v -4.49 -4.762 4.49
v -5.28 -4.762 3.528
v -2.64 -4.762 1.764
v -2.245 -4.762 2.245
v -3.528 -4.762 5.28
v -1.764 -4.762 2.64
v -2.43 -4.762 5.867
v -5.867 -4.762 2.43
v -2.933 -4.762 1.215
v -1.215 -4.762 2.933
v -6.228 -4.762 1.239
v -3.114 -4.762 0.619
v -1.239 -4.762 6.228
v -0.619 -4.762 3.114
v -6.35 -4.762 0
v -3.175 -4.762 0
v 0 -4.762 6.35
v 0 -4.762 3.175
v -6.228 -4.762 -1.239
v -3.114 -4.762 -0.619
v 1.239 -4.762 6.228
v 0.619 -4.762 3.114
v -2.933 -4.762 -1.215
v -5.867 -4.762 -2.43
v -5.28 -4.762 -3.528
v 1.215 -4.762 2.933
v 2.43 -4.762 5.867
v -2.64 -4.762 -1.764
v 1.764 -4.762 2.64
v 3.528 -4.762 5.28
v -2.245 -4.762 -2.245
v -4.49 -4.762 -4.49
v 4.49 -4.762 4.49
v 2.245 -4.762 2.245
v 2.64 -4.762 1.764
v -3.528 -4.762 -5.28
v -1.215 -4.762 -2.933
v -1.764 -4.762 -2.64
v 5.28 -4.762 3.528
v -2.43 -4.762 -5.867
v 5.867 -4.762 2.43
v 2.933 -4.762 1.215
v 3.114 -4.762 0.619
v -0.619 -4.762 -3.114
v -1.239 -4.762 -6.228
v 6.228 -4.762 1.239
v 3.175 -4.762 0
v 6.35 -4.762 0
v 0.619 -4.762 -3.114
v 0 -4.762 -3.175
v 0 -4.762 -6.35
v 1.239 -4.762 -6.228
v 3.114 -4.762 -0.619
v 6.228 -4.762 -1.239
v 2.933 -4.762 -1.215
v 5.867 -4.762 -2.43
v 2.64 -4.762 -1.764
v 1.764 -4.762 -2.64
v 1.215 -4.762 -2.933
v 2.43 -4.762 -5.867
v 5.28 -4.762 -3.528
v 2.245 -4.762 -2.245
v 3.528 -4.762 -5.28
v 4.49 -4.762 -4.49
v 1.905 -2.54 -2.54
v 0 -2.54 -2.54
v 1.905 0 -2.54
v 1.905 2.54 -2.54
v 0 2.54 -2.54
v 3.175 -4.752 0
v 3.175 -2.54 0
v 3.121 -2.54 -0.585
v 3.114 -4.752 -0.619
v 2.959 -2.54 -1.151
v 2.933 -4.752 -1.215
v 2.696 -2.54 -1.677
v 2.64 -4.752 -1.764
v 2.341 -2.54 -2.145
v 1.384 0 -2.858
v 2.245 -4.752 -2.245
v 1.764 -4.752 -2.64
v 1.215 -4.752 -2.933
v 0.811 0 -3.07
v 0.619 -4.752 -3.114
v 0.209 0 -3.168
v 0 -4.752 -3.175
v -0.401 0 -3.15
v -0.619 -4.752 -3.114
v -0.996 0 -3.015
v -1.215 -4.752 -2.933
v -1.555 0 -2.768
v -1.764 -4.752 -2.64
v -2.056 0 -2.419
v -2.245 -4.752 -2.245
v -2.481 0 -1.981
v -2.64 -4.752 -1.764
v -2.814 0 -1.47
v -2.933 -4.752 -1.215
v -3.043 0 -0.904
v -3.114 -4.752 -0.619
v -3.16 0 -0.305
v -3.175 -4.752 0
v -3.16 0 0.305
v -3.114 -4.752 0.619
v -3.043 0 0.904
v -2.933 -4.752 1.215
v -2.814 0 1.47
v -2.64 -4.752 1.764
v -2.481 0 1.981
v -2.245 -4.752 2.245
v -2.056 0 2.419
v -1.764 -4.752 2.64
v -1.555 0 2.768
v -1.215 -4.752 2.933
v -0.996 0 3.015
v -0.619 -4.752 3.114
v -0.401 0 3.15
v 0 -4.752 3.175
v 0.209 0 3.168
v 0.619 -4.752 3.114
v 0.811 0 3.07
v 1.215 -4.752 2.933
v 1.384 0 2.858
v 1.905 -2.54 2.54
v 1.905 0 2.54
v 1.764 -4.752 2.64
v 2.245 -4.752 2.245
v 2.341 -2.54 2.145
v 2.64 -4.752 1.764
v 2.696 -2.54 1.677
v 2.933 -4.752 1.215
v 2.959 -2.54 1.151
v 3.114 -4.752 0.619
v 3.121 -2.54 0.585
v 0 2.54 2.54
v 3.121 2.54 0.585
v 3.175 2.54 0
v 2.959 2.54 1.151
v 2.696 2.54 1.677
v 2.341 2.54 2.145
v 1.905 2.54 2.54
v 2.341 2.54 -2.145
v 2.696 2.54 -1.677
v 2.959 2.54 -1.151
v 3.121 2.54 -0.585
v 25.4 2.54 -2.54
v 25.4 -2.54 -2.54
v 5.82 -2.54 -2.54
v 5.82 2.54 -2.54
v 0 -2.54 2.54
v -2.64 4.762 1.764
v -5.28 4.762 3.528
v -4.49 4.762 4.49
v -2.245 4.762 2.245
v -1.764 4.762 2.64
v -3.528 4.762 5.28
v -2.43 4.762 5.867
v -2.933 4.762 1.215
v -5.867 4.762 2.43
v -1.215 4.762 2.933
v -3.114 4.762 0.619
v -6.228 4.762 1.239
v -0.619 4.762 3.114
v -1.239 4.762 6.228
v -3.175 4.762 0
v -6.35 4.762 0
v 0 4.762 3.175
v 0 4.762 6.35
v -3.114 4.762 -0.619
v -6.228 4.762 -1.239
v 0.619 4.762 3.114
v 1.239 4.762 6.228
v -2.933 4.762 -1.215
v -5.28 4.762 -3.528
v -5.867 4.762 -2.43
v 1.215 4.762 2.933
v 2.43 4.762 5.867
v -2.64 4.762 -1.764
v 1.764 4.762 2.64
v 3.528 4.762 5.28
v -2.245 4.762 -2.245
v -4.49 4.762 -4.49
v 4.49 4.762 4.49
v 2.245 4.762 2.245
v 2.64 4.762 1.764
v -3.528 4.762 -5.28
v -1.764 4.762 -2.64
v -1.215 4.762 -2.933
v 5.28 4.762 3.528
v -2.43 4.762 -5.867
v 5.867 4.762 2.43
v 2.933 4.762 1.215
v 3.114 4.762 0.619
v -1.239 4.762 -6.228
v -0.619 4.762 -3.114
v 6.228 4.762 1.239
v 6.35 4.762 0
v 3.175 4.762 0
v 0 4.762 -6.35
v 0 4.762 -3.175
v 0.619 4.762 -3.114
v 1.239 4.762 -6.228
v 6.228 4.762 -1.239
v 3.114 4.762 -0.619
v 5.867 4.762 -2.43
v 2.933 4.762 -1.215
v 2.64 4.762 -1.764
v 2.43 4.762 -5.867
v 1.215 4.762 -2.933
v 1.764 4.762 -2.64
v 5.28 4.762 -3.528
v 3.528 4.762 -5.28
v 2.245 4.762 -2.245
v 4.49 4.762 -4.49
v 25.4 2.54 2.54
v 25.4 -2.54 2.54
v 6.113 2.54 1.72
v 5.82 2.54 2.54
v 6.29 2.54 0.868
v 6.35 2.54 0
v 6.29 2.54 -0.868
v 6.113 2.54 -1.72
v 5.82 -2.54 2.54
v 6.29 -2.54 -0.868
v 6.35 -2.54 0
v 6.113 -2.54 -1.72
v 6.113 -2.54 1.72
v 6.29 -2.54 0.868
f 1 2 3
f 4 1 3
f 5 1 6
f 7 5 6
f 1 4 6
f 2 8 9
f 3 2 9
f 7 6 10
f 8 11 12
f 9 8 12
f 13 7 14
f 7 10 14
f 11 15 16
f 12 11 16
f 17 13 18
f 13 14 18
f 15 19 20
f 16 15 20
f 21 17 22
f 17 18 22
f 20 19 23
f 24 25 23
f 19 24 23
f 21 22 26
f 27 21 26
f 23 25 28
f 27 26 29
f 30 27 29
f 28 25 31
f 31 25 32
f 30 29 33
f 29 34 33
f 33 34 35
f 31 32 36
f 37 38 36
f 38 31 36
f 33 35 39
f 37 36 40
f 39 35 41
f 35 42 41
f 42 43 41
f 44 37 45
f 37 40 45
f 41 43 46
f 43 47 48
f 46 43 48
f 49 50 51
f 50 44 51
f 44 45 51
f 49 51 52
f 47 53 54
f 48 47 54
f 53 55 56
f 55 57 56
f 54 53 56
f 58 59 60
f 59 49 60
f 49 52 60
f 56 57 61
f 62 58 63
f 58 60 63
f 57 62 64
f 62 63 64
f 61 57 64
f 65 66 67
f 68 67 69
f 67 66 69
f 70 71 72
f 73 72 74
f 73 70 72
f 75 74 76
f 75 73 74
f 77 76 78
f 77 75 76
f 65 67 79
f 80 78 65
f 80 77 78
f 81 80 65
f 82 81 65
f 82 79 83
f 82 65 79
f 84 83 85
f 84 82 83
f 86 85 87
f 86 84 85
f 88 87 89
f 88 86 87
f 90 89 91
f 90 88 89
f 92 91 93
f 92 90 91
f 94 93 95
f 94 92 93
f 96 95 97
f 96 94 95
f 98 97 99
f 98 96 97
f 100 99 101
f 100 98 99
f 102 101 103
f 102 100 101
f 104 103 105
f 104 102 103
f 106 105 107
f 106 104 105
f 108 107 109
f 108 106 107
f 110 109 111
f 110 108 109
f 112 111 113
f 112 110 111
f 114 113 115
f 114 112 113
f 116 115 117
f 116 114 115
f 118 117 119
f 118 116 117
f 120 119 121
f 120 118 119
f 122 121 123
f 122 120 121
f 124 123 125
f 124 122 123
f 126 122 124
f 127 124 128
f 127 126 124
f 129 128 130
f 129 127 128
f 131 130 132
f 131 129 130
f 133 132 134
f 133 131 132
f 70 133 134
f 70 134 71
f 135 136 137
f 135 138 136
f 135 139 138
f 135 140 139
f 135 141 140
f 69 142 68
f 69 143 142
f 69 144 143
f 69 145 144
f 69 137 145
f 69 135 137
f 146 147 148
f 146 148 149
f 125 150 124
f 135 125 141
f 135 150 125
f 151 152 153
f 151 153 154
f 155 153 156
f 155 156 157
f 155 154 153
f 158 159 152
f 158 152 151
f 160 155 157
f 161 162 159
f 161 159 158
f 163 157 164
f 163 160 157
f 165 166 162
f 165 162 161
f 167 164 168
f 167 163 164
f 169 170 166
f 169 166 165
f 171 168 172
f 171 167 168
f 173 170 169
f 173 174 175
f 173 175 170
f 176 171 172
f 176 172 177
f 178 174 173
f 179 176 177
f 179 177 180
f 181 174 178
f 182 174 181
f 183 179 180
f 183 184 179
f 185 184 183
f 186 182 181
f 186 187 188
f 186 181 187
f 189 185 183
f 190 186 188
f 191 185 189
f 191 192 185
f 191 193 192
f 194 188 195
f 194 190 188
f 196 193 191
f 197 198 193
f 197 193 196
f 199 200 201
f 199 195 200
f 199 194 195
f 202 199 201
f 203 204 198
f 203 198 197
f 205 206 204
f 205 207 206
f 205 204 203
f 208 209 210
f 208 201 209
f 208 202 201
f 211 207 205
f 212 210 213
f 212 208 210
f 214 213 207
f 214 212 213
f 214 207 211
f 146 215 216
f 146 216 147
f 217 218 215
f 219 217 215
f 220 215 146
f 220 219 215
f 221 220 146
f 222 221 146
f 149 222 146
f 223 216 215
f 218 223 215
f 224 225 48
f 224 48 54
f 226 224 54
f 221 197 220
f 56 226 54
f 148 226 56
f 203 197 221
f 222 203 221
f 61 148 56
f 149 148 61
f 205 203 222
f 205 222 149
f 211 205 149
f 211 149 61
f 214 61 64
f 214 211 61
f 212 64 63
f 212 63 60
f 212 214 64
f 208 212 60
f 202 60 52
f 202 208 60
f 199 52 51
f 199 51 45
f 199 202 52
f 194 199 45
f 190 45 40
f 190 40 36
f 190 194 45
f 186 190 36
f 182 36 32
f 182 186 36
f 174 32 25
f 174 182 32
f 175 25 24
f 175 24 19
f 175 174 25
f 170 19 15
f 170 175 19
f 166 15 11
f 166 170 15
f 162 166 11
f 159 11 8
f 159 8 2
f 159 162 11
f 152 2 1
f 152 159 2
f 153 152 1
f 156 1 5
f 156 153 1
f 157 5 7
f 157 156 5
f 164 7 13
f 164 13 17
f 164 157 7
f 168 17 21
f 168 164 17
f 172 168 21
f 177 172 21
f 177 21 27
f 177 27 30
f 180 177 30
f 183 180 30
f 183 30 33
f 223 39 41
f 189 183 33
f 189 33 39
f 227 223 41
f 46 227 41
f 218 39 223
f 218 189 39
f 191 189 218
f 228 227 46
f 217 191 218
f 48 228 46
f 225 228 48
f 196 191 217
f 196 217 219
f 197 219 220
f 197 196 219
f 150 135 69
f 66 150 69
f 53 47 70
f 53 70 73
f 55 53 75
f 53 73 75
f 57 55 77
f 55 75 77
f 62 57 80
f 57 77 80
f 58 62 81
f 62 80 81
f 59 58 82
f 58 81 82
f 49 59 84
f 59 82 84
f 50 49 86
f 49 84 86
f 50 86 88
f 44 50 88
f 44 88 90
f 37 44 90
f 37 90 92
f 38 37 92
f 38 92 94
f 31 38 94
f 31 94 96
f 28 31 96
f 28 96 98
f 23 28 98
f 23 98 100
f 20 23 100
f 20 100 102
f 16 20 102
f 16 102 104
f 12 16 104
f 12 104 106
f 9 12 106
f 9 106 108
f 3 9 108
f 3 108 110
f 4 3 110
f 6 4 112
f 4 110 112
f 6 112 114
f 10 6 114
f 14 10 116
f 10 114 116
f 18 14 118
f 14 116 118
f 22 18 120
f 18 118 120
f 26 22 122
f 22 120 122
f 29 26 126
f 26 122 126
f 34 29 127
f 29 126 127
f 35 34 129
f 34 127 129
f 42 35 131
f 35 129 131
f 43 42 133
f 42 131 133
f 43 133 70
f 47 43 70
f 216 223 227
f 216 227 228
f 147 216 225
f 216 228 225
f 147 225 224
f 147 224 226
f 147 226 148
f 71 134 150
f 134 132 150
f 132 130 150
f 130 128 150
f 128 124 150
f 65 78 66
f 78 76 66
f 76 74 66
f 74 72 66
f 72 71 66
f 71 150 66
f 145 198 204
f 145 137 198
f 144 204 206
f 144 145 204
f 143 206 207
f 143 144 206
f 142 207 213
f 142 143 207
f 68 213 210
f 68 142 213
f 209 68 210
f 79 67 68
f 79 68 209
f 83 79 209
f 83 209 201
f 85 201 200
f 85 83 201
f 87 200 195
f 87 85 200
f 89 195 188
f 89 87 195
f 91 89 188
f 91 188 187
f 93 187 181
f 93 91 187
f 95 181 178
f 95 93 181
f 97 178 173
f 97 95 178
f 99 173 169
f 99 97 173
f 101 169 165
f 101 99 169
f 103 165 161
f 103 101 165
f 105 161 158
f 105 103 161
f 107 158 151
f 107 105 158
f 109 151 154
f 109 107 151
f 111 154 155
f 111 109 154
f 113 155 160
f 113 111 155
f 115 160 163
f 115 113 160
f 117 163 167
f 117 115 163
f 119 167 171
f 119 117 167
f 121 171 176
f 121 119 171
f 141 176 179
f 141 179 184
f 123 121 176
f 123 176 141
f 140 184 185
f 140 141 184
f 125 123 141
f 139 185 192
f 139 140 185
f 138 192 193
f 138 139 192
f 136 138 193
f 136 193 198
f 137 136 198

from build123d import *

# Parameters (mm, degrees)
SKETCH2_R                = 3.175
CUT_EXTRUDE1_DEPTH       = 6.715
CUT_EXTRUDE1_DEPTH_BACK  = 6.715
SKETCH3_R                = 6.35
SKETCH3_R_2              = 3.175
BOSS_EXTRUDE1_DEPTH      = 4.7625
BOSS_EXTRUDE1_DEPTH_BACK = 4.7625
SKETCH4_W                = 5.08
SKETCH4_H                = 5.08
BOSS_EXTRUDE2_DEPTH      = 25.4


with BuildPart() as part:
    # Sketch1 → Revolve1 (revolve)
    with BuildSketch(Plane.XY):
        with BuildLine():
            Line((0, 5.715), (0, -5.715))
            ThreePointArc((0, -5.715), (5.715, 0), (0, 5.715))
        make_face()
    revolve(axis=Axis((0, 5.715, 0), (0, -1, 0)))

    # Sketch2 → Cut-Extrude1 (cut, two sides)
    with BuildSketch(Plane(origin=(0, 0, 0), x_dir=(1, 0, 0), z_dir=(0, 1, 0))) as cut_extrude1_sk:
        Circle(SKETCH2_R)
    extrude(amount=CUT_EXTRUDE1_DEPTH, mode=Mode.SUBTRACT)
    extrude(cut_extrude1_sk.sketch, amount=-CUT_EXTRUDE1_DEPTH_BACK, mode=Mode.SUBTRACT)

    # Sketch3 → Boss-Extrude1 (add, two sides)
    with BuildSketch(Plane(origin=(0, 0, 0), x_dir=(1, 0, 0), z_dir=(0, 1, 0))) as boss_extrude1_sk:
        Circle(SKETCH3_R)
        Circle(SKETCH3_R_2, mode=Mode.SUBTRACT)
    extrude(amount=BOSS_EXTRUDE1_DEPTH)
    extrude(boss_extrude1_sk.sketch, amount=-BOSS_EXTRUDE1_DEPTH_BACK)

    # Sketch4 → Boss-Extrude2 (add)
    with BuildSketch(Plane(origin=(0, 0, 0), x_dir=(0, 0, -1), z_dir=(1, 0, 0))):
        Rectangle(SKETCH4_W, SKETCH4_H)
    extrude(amount=BOSS_EXTRUDE2_DEPTH)


solid = part.part
